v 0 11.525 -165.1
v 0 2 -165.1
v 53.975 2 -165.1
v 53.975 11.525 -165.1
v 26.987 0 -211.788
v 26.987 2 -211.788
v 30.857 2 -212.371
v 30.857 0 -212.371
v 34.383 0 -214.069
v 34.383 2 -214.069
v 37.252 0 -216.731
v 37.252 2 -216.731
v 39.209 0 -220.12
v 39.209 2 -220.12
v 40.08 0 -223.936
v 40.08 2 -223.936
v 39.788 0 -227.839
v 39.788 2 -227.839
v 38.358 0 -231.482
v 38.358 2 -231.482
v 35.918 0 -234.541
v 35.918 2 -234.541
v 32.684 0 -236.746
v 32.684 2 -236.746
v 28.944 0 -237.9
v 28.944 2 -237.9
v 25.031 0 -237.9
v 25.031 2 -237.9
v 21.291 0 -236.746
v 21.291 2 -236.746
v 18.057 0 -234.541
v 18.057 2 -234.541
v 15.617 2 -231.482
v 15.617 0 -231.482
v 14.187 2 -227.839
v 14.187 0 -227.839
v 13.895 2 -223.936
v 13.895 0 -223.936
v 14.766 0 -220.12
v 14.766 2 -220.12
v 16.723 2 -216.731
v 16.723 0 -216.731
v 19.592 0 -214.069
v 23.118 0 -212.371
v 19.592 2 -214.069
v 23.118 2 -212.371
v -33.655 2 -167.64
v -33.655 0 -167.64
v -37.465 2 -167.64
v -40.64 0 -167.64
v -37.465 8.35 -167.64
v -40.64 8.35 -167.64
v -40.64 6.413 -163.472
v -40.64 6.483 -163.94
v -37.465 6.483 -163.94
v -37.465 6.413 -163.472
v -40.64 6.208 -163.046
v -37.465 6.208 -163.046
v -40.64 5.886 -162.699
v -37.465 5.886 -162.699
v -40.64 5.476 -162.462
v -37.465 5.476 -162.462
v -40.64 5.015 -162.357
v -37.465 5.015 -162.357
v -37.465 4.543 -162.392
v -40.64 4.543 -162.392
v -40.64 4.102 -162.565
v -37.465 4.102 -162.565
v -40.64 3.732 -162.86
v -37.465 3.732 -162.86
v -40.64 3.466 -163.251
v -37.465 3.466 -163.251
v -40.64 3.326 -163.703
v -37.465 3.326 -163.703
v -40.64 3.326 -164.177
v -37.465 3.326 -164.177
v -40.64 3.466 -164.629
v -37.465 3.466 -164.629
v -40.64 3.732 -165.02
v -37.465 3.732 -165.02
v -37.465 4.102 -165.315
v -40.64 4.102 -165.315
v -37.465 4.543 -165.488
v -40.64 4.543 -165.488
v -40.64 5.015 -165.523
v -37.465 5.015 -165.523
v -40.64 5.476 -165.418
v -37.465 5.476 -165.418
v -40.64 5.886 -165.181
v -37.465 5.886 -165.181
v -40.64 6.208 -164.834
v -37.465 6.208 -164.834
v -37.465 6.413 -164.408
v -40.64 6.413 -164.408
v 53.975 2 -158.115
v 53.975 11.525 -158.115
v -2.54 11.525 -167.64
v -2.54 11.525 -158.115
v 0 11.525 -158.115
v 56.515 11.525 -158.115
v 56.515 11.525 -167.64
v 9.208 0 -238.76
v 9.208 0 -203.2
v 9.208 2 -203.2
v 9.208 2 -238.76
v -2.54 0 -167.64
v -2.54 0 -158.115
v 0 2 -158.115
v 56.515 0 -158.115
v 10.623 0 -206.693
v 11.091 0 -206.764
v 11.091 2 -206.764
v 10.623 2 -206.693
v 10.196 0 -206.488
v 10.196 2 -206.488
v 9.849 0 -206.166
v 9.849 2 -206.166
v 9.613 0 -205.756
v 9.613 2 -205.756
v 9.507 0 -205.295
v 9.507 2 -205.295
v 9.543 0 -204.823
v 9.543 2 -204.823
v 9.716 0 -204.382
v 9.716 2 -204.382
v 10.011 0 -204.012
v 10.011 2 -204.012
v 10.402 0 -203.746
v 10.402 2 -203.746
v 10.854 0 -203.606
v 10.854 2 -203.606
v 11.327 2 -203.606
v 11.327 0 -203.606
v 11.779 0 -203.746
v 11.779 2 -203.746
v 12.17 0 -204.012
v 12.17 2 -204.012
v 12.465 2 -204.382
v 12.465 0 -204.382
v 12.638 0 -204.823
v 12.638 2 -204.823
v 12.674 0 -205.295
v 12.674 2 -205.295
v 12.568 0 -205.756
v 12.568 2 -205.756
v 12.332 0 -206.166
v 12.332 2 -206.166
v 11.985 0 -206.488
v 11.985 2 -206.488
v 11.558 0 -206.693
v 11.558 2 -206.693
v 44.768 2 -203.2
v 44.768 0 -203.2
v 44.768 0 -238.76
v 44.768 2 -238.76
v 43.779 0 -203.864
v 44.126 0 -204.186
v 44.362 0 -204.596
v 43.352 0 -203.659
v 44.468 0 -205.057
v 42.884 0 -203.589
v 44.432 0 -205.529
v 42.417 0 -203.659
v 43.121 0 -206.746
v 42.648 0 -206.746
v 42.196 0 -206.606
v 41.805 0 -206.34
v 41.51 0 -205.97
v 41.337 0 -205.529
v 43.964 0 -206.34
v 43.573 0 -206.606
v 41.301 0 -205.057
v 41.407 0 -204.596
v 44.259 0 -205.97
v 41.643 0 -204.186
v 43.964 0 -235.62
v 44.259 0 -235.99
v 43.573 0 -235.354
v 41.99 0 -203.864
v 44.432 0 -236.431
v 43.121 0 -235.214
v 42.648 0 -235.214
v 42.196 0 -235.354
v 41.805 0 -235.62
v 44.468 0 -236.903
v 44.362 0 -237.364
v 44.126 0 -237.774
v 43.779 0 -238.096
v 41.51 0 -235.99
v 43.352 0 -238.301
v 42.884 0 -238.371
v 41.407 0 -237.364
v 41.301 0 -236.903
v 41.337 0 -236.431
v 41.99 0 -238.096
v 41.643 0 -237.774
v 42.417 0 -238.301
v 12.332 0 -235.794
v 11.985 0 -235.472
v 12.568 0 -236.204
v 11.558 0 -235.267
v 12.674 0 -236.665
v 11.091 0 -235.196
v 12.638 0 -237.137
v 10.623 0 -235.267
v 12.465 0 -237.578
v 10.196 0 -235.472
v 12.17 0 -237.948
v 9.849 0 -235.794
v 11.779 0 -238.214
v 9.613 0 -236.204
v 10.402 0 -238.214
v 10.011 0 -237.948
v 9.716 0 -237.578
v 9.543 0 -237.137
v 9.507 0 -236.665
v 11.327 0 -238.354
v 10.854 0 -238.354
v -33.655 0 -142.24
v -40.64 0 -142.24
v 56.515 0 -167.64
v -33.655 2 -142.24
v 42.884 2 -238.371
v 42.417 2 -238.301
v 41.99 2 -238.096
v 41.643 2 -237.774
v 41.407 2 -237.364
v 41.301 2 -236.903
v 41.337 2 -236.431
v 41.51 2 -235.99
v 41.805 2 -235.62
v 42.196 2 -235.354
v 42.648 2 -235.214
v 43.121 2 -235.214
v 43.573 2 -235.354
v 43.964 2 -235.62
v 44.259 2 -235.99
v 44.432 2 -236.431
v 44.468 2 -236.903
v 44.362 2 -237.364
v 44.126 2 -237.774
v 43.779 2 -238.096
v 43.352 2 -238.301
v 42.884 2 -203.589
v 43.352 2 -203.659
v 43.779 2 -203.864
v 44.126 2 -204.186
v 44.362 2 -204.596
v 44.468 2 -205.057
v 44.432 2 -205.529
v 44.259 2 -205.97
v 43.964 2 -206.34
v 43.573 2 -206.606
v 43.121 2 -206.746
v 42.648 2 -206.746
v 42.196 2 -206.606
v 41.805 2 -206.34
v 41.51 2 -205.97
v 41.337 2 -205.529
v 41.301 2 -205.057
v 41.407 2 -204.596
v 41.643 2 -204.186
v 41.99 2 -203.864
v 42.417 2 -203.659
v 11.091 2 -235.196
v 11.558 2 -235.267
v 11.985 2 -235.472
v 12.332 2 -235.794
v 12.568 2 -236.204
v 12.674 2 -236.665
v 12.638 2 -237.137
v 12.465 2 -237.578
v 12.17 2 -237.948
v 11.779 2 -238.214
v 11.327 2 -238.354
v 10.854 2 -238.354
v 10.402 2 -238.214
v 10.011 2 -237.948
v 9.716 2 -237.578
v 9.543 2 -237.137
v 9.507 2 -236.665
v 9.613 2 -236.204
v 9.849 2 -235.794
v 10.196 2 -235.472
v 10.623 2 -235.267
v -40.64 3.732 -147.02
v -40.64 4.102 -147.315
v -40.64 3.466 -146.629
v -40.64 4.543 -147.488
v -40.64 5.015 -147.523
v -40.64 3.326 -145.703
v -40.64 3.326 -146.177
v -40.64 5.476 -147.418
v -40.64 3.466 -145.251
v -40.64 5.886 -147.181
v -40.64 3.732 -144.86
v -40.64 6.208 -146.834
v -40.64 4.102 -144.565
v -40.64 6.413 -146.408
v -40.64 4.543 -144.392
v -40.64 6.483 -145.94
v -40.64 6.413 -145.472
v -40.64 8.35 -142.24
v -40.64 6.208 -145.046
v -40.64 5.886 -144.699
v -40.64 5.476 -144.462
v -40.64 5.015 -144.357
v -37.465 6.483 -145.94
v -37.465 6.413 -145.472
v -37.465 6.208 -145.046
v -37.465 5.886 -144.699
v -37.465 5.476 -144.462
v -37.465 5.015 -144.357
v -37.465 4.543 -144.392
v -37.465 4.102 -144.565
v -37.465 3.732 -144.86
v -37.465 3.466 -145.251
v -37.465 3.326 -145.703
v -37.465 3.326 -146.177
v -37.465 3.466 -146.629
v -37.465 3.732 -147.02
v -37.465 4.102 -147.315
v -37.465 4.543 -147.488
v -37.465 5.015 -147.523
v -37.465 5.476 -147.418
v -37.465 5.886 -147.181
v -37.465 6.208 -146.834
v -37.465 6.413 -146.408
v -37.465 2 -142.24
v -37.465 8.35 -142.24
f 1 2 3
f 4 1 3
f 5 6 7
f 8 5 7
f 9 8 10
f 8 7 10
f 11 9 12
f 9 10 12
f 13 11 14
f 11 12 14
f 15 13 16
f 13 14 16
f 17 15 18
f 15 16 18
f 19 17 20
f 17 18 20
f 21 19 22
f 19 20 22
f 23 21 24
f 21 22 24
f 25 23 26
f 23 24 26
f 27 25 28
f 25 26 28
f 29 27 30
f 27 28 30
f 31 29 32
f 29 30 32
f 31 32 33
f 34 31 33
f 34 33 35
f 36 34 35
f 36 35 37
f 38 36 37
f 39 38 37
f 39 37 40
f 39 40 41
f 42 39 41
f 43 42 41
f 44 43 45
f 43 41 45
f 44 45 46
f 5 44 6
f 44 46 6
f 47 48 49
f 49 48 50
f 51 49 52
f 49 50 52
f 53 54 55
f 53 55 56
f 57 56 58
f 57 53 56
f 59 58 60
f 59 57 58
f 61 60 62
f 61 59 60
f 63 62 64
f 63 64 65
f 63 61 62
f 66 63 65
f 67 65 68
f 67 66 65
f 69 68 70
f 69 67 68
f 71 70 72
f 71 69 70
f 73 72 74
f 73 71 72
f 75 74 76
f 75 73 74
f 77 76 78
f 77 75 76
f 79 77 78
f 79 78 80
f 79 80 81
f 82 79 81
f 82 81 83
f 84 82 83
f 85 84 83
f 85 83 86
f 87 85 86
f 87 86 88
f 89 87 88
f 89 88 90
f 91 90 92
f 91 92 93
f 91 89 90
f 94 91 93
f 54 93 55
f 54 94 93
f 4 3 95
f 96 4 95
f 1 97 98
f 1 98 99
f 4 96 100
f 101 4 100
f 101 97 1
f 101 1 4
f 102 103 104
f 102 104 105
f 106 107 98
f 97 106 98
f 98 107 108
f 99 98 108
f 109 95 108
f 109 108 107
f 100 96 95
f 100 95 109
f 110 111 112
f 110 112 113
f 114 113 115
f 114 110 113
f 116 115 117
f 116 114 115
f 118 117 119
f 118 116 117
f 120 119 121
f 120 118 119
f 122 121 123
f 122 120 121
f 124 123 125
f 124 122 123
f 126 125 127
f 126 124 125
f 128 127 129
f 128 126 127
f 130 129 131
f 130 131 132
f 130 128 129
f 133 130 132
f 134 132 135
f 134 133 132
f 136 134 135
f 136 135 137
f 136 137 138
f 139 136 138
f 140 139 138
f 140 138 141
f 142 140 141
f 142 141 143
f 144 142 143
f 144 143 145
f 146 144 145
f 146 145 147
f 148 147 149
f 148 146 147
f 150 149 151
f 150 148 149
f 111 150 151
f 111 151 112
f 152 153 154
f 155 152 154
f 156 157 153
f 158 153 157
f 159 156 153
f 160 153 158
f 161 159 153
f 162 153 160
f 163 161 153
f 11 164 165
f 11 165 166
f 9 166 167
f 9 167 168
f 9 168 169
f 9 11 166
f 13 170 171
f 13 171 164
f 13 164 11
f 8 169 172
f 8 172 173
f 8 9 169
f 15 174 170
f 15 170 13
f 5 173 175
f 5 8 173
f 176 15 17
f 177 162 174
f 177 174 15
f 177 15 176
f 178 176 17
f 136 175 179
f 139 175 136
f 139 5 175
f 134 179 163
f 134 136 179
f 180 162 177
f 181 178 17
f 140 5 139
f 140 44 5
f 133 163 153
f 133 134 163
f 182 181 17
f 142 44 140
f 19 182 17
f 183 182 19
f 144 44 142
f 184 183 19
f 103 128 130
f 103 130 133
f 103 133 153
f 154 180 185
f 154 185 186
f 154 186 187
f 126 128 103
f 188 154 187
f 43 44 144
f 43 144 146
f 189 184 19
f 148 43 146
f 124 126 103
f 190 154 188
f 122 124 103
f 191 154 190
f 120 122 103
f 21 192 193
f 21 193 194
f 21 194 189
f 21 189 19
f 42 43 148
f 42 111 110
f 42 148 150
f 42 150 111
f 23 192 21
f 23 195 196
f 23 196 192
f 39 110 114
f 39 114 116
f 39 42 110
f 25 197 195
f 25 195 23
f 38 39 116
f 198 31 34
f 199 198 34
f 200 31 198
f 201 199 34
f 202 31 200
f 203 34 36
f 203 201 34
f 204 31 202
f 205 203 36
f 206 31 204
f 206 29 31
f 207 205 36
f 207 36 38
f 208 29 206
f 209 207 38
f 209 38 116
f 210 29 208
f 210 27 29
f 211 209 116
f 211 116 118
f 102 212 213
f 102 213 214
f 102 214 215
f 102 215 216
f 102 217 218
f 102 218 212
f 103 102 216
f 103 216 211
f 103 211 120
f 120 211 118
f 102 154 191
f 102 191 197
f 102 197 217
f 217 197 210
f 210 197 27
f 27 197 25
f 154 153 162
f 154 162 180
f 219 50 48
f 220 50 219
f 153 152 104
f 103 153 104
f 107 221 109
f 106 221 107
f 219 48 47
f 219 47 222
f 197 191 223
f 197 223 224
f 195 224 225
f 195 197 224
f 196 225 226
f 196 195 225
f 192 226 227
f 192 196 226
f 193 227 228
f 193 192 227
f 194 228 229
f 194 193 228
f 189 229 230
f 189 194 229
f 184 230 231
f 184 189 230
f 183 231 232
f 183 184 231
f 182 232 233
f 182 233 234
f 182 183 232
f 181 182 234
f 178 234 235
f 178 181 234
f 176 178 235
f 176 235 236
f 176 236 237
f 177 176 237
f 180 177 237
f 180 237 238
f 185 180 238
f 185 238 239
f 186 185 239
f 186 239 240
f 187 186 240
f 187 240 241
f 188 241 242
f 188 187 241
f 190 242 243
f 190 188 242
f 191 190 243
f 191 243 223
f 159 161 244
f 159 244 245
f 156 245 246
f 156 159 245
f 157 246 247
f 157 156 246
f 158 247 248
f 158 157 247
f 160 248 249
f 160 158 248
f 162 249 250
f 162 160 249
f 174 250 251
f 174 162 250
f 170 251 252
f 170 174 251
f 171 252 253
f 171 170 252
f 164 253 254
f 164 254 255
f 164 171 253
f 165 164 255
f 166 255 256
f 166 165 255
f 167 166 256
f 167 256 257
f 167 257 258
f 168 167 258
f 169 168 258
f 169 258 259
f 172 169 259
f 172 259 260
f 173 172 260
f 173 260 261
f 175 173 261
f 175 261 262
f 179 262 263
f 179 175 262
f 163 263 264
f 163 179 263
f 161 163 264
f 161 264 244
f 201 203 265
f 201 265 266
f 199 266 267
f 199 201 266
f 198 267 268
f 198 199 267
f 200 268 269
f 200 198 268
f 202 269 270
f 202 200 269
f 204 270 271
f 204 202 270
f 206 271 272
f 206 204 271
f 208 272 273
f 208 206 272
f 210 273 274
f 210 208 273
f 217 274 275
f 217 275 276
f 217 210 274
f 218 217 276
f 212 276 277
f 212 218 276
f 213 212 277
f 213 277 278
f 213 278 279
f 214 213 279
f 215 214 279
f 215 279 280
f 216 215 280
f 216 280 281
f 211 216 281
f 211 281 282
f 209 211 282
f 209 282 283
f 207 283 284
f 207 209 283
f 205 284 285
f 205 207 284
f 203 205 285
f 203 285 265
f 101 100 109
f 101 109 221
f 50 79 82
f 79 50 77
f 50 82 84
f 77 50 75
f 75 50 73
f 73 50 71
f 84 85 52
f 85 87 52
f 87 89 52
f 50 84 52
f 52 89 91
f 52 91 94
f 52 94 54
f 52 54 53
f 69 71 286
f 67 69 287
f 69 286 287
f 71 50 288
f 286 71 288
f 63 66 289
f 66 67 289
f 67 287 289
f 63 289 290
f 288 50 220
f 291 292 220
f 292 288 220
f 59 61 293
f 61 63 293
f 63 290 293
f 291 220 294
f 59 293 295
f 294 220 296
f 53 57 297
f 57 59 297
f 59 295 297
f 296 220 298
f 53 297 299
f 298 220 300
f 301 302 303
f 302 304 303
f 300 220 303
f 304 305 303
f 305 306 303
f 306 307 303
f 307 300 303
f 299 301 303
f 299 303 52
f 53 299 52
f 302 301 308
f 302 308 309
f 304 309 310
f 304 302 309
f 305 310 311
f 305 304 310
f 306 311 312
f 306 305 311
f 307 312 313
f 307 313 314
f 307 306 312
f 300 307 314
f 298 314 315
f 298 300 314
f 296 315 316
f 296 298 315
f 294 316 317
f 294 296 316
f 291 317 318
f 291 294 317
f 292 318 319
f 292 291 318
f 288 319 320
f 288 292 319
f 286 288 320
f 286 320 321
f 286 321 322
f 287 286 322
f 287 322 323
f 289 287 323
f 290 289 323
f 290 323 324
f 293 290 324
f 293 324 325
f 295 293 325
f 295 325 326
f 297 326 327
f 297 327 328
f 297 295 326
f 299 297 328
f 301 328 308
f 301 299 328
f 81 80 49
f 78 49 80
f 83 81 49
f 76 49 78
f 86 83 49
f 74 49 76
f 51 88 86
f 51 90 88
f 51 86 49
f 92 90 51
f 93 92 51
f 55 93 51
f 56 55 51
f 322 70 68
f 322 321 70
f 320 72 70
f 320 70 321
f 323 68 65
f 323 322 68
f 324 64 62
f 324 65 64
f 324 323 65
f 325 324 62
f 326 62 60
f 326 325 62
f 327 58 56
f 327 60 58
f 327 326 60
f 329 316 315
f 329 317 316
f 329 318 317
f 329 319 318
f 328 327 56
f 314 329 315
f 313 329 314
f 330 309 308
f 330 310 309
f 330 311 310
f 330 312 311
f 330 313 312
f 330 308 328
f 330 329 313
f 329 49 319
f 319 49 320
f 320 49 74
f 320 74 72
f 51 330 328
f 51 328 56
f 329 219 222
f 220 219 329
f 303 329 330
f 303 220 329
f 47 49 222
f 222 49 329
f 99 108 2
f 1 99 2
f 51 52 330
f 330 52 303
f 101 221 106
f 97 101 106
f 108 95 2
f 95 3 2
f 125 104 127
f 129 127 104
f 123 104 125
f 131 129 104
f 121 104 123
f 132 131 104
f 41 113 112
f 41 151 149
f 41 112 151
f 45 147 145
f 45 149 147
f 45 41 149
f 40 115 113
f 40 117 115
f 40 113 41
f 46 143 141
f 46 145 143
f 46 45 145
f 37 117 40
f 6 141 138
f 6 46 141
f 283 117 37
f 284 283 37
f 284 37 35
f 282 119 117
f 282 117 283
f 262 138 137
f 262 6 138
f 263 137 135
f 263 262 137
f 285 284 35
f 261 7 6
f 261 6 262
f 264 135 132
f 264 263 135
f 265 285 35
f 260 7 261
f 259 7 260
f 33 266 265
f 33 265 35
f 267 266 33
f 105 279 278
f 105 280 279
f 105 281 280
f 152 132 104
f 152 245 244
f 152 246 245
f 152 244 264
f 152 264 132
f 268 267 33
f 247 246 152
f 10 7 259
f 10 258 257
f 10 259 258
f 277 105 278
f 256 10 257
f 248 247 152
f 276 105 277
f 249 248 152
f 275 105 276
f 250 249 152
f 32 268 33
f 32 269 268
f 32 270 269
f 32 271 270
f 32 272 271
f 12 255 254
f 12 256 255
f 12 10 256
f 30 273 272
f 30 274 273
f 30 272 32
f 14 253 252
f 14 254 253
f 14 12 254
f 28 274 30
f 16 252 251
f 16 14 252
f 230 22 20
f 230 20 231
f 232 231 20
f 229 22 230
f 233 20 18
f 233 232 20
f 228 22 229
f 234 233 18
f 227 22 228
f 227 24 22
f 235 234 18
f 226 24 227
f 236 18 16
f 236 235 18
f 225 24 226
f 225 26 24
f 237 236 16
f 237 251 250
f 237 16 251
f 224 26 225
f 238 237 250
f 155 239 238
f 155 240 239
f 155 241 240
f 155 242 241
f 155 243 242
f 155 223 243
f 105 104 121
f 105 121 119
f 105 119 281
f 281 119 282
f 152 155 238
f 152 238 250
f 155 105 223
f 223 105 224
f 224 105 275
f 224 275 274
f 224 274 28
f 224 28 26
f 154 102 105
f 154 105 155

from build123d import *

# Parameters (mm, degrees)
SKETCH2_W           = 59.055
SKETCH2_H           = 25.4
BOSS_EXTRUDE1_DEPTH = 2
BOSS_EXTRUDE2_START = 2
BOSS_EXTRUDE2_DEPTH = 9.525
SKETCH3_W           = 38.1
SKETCH3_H           = 25.4
BOSS_EXTRUDE3_DEPTH = 2
BOSS_EXTRUDE4_START = 2
SKETCH4_W           = 3.175
SKETCH4_H           = 25.4
BOSS_EXTRUDE4_DEPTH = 6.35
SKETCH5_R           = 1.5875
CUT_EXTRUDE1_DEPTH  = 3.175
SKETCH6_W           = 35.56
SKETCH6_H           = 71.12
SKETCH6_R           = 1.5875
BOSS_EXTRUDE5_DEPTH = 2
FILLET1_R           = 2.54
SKETCH10_R          = 13.129221829
CUT_EXTRUDE2_DEPTH  = 2
SPLIT3_START        = -40.64
SPLIT3_OUTLINE_W    = 2
SPLIT3_OUTLINE_H    = 25.4
SPLIT3_DEPTH        = 38.1
SPLIT3_2_OUTLINE_W  = 6.35
SPLIT3_2_OUTLINE_H  = 25.4
SPLIT3_2_OUTLINE_R  = 1.5875
SPLIT3_2_DEPTH      = 3.175
SPLIT3_3_OUTLINE_W  = 8.35
SPLIT3_3_OUTLINE_H  = 25.4
SPLIT3_3_OUTLINE_R  = 1.5875
SPLIT3_3_DEPTH      = 38.1
SPLIT3_START_2      = 56.515
SPLIT3_4_OUTLINE_W  = 8.35
SPLIT3_4_OUTLINE_H  = 25.4
SPLIT3_4_OUTLINE_R  = 1.5875
SPLIT3_4_DEPTH      = 38.1
SPLIT3_5_OUTLINE_W  = 2
SPLIT3_5_OUTLINE_H  = 25.4
SPLIT3_5_DEPTH      = 38.1
SPLIT3_START_3      = 91.44
SPLIT3_6_OUTLINE_W  = 6.35
SPLIT3_6_OUTLINE_H  = 25.4
SPLIT3_6_OUTLINE_R  = 1.5875
SPLIT3_6_DEPTH      = 3.175


# Read off the part's stored shape, not the designer's step: Split3, Split4
with BuildPart() as part:
    # Sketch2 → Boss-Extrude1 (new body)
    with BuildSketch(Plane(origin=(0, 0, 0), x_dir=(1, 0, 0), z_dir=(0, 1, 0))):
        with Locations((26.9875, 154.94)):
            Rectangle(SKETCH2_W, SKETCH2_H)
    extrude(amount=BOSS_EXTRUDE1_DEPTH)

    # Sketch1 → Boss-Extrude2 (add)
    with BuildSketch(Plane(origin=(0, 0, 0), x_dir=(1, 0, 0), z_dir=(0, 1, 0)).offset(BOSS_EXTRUDE2_START)):
        Polygon((-2.54, 167.64), (-2.54, 158.115), (0, 158.115), (0, 165.1), (53.975, 165.1), (53.975, 158.115), (56.515, 158.115), (56.515, 167.64), align=None)
    extrude(amount=BOSS_EXTRUDE2_DEPTH)

    # Sketch3 → Boss-Extrude3 (add)
    with BuildSketch(Plane(origin=(0, 0, 0), x_dir=(1, 0, 0), z_dir=(0, 1, 0))):
        with Locations((75.565, 154.94)):
            Rectangle(SKETCH3_W, SKETCH3_H)
    extrude(amount=BOSS_EXTRUDE3_DEPTH)

    # Sketch4 → Boss-Extrude4 (add)
    with BuildSketch(Plane(origin=(0, 0, 0), x_dir=(1, 0, 0), z_dir=(0, 1, 0)).offset(BOSS_EXTRUDE4_START)):
        with Locations((93.0275, 154.94)):
            Rectangle(SKETCH4_W, SKETCH4_H)
    extrude(amount=BOSS_EXTRUDE4_DEPTH)

    # Sketch5 → Cut-Extrude1 (cut)
    with BuildSketch(Plane(origin=(94.615, 0, 0), x_dir=(0, 0, -1), z_dir=(1, 0, 0))):
        with Locations((145.94, 4.895971622)):
            Circle(SKETCH5_R)
        with Locations(Location((163.94, 4.895971622, 0), (0, 0, 180))):
            Circle(SKETCH5_R)
    extrude(amount=-CUT_EXTRUDE1_DEPTH, mode=Mode.SUBTRACT)

    # Mirror1: part across plane


with BuildPart() as part_1:
    add(part.part)
    add(part.part.mirror(Plane(origin=(26.9875, 0, 0), x_dir=(0, 0, 1), z_dir=(1, 0, 0))))

    # Sketch6 → Boss-Extrude5 (add)
    with BuildSketch(Plane(origin=(0, 0, 0), x_dir=(1, 0, 0), z_dir=(0, 1, 0))):
        with Locations((26.9875, 203.2)):
            Rectangle(SKETCH6_W, SKETCH6_H)
        with Locations(Location((11.09051688, 236.783908574, 0), (0, 0, 270))):
            Circle(SKETCH6_R, mode=Mode.SUBTRACT)
        with Locations(Location((11.09051688, 205.176091426, 0), (0, 0, 90))):
            Circle(SKETCH6_R, mode=Mode.SUBTRACT)
        with Locations(Location((42.88448312, 205.176091426, 0), (0, 0, 270))):
            Circle(SKETCH6_R, mode=Mode.SUBTRACT)
        with Locations(Location((42.88448312, 236.783908574, 0), (0, 0, 90))):
            Circle(SKETCH6_R, mode=Mode.SUBTRACT)
    extrude(amount=BOSS_EXTRUDE5_DEPTH)

    # Fillet1
    fillet1_edges = [part_1.edges().sort_by_distance(p)[0] for p in [
        (26.9875, 2, -167.64),
    ]]
    fillet(fillet1_edges, radius=FILLET1_R)

    # Sketch10 → Cut-Extrude2 (cut)
    with BuildSketch(Plane(origin=(0, 2, 0), x_dir=(1, 0, 0), z_dir=(0, 1, 0))):
        with Locations(Location((26.9875, 224.917, 0), (0, 0, 270))):
            Circle(SKETCH10_R)
    extrude(amount=-CUT_EXTRUDE2_DEPTH, mode=Mode.SUBTRACT)


with BuildPart() as body_2:
    # Split1: the piece on the far side of the plane
    add(part_1.part)
    split(bisect_by=Plane(origin=(0, 0, -167.64), x_dir=(-1, 0, 0), z_dir=(0, 0, -1)), keep=Keep.BOTTOM)

    # Split3 3 outline → Split3 3 (cut)
    with BuildSketch(Plane.YZ.offset(SPLIT3_START)):
        with Locations((4.175, -154.94)):
            Rectangle(SPLIT3_3_OUTLINE_W, SPLIT3_3_OUTLINE_H)
        with Locations((4.895971622, -145.94)):
            Circle(SPLIT3_3_OUTLINE_R, mode=Mode.SUBTRACT)
        with Locations((4.895971622, -163.94)):
            Circle(SPLIT3_3_OUTLINE_R, mode=Mode.SUBTRACT)
    extrude(amount=SPLIT3_3_DEPTH, mode=Mode.SUBTRACT)

    # Split3 4 outline → Split3 4 (cut)
    with BuildSketch(Plane.YZ.offset(SPLIT3_START_2)):
        with Locations((4.175, -154.94)):
            Rectangle(SPLIT3_4_OUTLINE_W, SPLIT3_4_OUTLINE_H)
        with Locations((4.895971622, -145.94)):
            Circle(SPLIT3_4_OUTLINE_R, mode=Mode.SUBTRACT)
        with Locations((4.895971622, -163.94)):
            Circle(SPLIT3_4_OUTLINE_R, mode=Mode.SUBTRACT)
    extrude(amount=SPLIT3_4_DEPTH, mode=Mode.SUBTRACT)


with BuildPart() as part_2:
    add(part_1.part)

    # Split1
    split(bisect_by=Plane(origin=(0, 0, -167.64), x_dir=(-1, 0, 0), z_dir=(0, 0, -1)), keep=Keep.TOP)


with BuildPart() as body_3:
    # Split2: the piece on the far side of the plane
    add(part_2.part)
    split(bisect_by=Plane(origin=(0, 0, -203.2), x_dir=(-1, 0, 0), z_dir=(0, 0, -1)), keep=Keep.BOTTOM)


with BuildPart() as part_3:
    add(part_2.part)

    # Split2
    split(bisect_by=Plane(origin=(0, 0, -203.2), x_dir=(-1, 0, 0), z_dir=(0, 0, -1)), keep=Keep.TOP)


with BuildPart() as body_3_2:
    # Split3 outline → Split3 (new body)
    with BuildSketch(Plane.YZ.offset(SPLIT3_START)):
        with Locations((1, -154.94)):
            Rectangle(SPLIT3_OUTLINE_W, SPLIT3_OUTLINE_H)
    extrude(amount=SPLIT3_DEPTH)

    # Split3 2 outline → Split3 2 (add)
    with BuildSketch(Plane.YZ.offset(SPLIT3_START)):
        with Locations((5.175, -154.94)):
            Rectangle(SPLIT3_2_OUTLINE_W, SPLIT3_2_OUTLINE_H)
        with Locations((4.895971622, -163.94)):
            Circle(SPLIT3_2_OUTLINE_R, mode=Mode.SUBTRACT)
        with Locations((4.895971622, -145.94)):
            Circle(SPLIT3_2_OUTLINE_R, mode=Mode.SUBTRACT)
    extrude(amount=SPLIT3_2_DEPTH)


with BuildPart() as body_4:
    # Split3 5 outline → Split3 5 (new body)
    with BuildSketch(Plane.YZ.offset(SPLIT3_START_2)):
        with Locations((1, -154.94)):
            Rectangle(SPLIT3_5_OUTLINE_W, SPLIT3_5_OUTLINE_H)
    extrude(amount=SPLIT3_5_DEPTH)

    # Split3 6 outline → Split3 6 (add)
    with BuildSketch(Plane.YZ.offset(SPLIT3_START_3)):
        with Locations((5.175, -154.94)):
            Rectangle(SPLIT3_6_OUTLINE_W, SPLIT3_6_OUTLINE_H)
        with Locations((4.895971622, -163.94)):
            Circle(SPLIT3_6_OUTLINE_R, mode=Mode.SUBTRACT)
        with Locations((4.895971622, -145.94)):
            Circle(SPLIT3_6_OUTLINE_R, mode=Mode.SUBTRACT)
    extrude(amount=SPLIT3_6_DEPTH)


with BuildPart() as body_4_2:
    # Split4: the piece on the far side of the plane
    add(body_2.part)
    split(bisect_by=Plane.XY.offset(-158.115), keep=Keep.BOTTOM)


with BuildPart() as body_2_1:
    add(body_2.part)

    # Split4
    split(bisect_by=Plane.XY.offset(-158.115), keep=Keep.TOP)


with BuildPart() as body_4_3:
    # Split5: the piece on the far side of the plane
    add(body_3_2.part)
    split(bisect_by=Plane(origin=(-33.655, 0, 0), x_dir=(0, 0, 1), z_dir=(1, 0, 0)), keep=Keep.BOTTOM)


with BuildPart() as body_3_2_1:
    add(body_3_2.part)

    # Split5
    split(bisect_by=Plane(origin=(-33.655, 0, 0), x_dir=(0, 0, 1), z_dir=(1, 0, 0)), keep=Keep.TOP)


solid = Compound([part_3.part, body_4_2.part, body_4_3.part])
